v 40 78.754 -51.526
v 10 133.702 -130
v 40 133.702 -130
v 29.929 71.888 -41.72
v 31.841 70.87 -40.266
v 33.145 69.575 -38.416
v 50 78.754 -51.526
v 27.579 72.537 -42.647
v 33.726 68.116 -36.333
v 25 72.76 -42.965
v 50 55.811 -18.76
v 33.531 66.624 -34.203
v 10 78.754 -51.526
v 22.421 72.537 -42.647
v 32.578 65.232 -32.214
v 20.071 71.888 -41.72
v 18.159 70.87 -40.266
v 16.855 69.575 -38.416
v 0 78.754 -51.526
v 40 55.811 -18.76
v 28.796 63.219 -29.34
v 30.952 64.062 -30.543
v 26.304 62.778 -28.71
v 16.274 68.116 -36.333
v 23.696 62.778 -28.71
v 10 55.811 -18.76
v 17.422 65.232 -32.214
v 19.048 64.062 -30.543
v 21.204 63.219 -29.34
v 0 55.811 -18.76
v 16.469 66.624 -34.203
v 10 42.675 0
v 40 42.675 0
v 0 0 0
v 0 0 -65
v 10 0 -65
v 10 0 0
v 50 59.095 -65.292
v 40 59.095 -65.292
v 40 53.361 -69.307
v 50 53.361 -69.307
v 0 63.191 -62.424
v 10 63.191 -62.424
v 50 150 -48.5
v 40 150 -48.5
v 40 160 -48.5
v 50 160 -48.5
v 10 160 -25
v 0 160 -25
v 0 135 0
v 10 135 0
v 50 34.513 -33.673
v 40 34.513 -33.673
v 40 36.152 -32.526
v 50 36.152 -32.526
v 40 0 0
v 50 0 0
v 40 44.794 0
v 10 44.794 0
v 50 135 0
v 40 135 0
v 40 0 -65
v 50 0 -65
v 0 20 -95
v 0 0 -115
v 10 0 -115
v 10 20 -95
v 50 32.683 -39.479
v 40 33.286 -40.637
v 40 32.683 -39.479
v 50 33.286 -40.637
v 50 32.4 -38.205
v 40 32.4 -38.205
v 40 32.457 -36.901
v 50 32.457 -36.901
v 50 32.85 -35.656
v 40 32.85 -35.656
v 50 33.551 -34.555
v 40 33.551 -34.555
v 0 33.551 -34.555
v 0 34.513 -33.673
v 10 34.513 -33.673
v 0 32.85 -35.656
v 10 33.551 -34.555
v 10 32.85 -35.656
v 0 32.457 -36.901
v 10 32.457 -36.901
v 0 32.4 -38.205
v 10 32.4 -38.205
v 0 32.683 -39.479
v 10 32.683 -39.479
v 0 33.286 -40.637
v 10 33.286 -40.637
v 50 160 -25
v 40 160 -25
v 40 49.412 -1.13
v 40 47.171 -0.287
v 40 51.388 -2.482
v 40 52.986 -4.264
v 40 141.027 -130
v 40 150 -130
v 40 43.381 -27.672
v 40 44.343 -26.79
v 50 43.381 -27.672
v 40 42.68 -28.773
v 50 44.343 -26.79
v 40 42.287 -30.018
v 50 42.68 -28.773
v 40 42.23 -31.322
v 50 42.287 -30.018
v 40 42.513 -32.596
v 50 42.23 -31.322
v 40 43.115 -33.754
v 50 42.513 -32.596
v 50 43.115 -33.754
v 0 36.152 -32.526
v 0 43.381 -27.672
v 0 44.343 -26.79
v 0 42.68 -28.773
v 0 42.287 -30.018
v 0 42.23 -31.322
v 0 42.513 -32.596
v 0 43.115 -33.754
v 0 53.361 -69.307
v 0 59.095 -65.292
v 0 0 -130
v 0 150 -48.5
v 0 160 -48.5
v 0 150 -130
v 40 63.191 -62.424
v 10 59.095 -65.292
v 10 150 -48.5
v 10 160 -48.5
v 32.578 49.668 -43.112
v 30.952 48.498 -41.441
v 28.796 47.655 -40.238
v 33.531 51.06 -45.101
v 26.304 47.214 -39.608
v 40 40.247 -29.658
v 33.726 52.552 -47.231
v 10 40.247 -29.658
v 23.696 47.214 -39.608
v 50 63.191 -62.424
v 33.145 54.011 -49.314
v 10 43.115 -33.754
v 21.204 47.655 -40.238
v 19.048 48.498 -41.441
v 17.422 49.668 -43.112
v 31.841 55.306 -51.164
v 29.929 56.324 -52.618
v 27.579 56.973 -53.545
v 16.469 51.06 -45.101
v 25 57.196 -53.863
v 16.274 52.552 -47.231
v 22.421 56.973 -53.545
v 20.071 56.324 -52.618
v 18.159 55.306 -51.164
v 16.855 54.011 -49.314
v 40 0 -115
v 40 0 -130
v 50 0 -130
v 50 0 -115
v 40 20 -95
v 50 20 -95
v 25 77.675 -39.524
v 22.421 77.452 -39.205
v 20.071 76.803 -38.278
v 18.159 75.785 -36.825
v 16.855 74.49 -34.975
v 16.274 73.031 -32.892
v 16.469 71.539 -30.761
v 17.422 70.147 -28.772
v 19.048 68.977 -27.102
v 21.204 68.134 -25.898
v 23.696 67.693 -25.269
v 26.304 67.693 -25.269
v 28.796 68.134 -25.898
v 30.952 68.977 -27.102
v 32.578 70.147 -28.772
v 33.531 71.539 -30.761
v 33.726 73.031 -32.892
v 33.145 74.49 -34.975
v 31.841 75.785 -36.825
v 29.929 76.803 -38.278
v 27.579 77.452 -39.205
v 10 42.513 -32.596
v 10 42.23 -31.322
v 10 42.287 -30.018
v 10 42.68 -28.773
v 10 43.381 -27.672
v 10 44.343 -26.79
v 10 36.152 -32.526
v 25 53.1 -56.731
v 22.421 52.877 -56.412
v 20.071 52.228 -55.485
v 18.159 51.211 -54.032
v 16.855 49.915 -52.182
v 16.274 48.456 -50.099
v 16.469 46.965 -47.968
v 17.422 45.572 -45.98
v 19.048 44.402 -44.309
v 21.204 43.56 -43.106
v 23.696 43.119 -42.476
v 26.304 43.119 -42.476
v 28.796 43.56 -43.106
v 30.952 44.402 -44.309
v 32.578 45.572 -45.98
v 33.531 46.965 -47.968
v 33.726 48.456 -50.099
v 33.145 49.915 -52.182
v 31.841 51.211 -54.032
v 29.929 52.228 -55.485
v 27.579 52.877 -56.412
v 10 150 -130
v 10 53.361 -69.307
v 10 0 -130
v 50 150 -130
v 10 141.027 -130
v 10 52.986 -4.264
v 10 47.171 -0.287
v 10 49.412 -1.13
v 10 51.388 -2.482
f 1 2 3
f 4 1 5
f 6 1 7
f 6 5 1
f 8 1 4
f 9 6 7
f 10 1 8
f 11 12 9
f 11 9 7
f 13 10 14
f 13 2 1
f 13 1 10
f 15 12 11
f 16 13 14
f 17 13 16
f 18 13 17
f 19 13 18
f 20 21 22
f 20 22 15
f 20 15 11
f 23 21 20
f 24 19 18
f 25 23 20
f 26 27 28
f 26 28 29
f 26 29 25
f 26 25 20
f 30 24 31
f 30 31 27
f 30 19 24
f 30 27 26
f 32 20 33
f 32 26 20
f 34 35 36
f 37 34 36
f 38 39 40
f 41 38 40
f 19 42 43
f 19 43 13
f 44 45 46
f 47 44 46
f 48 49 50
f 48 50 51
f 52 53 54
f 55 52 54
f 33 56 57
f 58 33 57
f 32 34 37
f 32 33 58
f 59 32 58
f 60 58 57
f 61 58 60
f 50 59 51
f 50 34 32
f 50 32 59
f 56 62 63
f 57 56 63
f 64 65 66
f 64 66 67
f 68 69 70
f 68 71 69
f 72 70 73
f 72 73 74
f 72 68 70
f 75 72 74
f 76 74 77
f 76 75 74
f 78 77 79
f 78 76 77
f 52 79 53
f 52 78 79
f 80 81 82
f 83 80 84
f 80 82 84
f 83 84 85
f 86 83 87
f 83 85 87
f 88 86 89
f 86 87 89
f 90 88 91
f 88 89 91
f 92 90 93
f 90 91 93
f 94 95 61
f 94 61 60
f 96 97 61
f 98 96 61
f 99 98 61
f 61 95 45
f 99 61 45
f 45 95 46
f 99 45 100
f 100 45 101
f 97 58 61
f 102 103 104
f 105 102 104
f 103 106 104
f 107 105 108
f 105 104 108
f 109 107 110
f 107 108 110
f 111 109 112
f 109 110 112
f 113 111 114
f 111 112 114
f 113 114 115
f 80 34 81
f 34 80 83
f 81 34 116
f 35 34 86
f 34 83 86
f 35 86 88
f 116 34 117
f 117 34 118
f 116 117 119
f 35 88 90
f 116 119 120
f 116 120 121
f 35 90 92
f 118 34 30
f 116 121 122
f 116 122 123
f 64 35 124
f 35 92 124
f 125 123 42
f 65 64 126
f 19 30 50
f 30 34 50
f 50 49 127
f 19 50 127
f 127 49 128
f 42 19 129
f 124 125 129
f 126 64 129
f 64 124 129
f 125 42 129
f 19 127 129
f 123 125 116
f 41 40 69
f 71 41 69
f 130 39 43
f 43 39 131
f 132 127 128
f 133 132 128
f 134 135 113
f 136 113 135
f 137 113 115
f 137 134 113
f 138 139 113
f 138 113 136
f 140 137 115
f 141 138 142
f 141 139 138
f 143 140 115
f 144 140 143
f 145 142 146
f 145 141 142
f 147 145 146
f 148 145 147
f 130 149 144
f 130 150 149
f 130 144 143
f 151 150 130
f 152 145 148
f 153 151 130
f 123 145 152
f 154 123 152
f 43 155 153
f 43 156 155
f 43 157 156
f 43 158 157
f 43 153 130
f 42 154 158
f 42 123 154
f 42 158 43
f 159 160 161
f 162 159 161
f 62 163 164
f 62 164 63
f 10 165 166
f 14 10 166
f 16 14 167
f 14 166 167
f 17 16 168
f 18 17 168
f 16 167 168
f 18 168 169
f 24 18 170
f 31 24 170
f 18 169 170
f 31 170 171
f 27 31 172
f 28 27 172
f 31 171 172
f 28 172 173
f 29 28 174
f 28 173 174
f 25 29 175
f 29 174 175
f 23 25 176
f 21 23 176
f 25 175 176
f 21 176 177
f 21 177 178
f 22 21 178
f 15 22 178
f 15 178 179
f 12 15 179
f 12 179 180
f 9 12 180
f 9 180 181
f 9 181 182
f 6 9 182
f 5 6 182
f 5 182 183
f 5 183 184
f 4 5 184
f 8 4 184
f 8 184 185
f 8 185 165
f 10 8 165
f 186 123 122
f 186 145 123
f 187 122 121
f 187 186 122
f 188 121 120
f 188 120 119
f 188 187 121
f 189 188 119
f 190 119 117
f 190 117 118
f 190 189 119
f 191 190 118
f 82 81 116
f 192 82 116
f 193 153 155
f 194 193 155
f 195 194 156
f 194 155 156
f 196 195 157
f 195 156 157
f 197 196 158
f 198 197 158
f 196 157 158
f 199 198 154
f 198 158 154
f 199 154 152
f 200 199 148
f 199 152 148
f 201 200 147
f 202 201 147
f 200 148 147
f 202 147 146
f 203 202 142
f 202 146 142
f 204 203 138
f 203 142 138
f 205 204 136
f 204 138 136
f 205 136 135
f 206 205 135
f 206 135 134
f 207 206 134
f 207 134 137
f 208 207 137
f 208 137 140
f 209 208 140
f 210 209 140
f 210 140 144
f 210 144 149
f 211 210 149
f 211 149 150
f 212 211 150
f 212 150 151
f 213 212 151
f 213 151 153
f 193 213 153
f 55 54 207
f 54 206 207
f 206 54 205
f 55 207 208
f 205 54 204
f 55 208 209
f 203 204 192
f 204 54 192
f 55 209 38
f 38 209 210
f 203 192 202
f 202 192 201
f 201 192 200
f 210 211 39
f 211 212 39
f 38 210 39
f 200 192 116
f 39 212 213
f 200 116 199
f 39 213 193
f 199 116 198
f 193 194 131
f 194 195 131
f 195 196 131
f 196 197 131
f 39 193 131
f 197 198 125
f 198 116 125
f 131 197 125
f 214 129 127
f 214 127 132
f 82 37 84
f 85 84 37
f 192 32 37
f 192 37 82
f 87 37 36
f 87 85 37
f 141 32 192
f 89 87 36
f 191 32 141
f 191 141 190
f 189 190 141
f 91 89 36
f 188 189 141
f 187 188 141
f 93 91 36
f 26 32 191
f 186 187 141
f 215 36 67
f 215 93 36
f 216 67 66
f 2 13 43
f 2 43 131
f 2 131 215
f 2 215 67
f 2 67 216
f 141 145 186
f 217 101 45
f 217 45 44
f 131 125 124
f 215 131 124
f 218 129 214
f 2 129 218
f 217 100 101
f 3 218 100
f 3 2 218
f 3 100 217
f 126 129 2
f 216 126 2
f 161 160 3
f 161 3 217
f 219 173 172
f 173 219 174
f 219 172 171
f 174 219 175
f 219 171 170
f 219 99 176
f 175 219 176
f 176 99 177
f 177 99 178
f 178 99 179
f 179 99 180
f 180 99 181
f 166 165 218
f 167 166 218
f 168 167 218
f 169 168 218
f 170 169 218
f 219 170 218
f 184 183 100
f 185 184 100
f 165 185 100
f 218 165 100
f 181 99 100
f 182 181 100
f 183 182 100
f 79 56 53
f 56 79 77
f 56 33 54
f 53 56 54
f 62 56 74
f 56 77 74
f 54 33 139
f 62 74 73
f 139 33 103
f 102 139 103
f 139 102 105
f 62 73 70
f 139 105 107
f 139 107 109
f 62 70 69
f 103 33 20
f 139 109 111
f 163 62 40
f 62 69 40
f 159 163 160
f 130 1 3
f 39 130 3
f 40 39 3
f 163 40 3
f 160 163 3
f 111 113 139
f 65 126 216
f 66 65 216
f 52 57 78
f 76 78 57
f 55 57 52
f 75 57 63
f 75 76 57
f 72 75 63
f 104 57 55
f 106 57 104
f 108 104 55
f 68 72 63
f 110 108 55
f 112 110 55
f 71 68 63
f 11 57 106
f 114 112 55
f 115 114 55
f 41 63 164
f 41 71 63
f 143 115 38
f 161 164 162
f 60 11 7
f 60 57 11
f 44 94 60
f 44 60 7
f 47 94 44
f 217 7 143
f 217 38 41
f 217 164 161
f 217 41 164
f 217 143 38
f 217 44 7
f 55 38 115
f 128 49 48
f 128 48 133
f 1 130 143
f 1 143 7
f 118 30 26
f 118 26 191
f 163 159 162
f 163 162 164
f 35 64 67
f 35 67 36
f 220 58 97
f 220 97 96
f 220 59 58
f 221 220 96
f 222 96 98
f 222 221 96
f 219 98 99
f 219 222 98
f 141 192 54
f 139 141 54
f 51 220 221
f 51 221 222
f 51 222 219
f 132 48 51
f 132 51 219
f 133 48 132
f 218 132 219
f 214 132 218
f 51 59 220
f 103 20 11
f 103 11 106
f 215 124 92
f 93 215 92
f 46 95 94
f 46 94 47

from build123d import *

# Parameters (mm, degrees)
SKETCH5_W           = 50.00000000000001
SKETCH5_H           = 130
BOSS_EXTRUDE1_DEPTH = 150
CUT_EXTRUDE1_START  = -25
CUT_EXTRUDE1_DEPTH  = 15
BOSS_EXTRUDE3_START = 30
BOSS_EXTRUDE3_DEPTH = 5
SKETCH10_R          = 8.750000000000018
CUT_EXTRUDE3_DEPTH  = 100
SKETCH18_W          = 48.5
SKETCH18_H          = 10
BOSS_EXTRUDE4_DEPTH = 10
BOSS_EXTRUDE5_START = 40
SKETCH18_2_W        = 48.5
SKETCH18_2_H        = 10
BOSS_EXTRUDE5_DEPTH = 10
CHAMFER1_SIZE       = 25
CUT_EXTRUDE5_DEPTH  = 70
FILLET1_R           = 5
CUT_EXTRUDE6_DEPTH  = 70
FILLET2_R           = 10


with BuildPart() as part:
    # Sketch5 → Boss-Extrude1 (new body)
    with BuildSketch(Plane(origin=(0, 0, 0), x_dir=(1, 0, 0), z_dir=(0, 1, 0))):
        with Locations((25.000000000000004, 65)):
            Rectangle(SKETCH5_W, SKETCH5_H)
    extrude(amount=BOSS_EXTRUDE1_DEPTH)

    # Sketch7 → Cut-Extrude1 (cut, symmetric)
    with BuildSketch(Plane(origin=(50, 0, 0), x_dir=(0, 0, -1), z_dir=(1, 0, 0)).offset(CUT_EXTRUDE1_START)):
        Polygon((0, 50), (129.99999999999997, 141.02697996726184), (130, 150), (0, 150), align=None)
        Polygon((130, 0), (130, 133.70233243469318), (0, 42.67535246743131), (0, 0), align=None)
    extrude(amount=CUT_EXTRUDE1_DEPTH, both=True, mode=Mode.SUBTRACT)

    # Sketch17 → Boss-Extrude3 (add)
    with BuildSketch(Plane(origin=(1.261e-14, 275.41205482615817, -321.9217767956235), x_dir=(1, 0, 0), z_dir=(0, -0.819152044288993, -0.5735764363510444)).offset(BOSS_EXTRUDE3_START)):
        Polygon((9.99999999999999, 374.2932281420449), (39.999999999999986, 374.2932281420449), (39.999999999999986, 334.2932281420449), (9.999999999999993, 334.2932281420449), align=None)
    extrude(amount=-BOSS_EXTRUDE3_DEPTH)

    # Sketch10 → Cut-Extrude3 (cut)
    with BuildSketch(Plane(origin=(0, 33.55050358314182, 23.492315519647676), x_dir=(1, 0, 0), z_dir=(0, 0.819152044288993, 0.5735764363510444))):
        with Locations((25, 68.17827312728308)):
            Circle(SKETCH10_R)
    extrude(amount=-CUT_EXTRUDE3_DEPTH, mode=Mode.SUBTRACT)

    # Sketch18 → Boss-Extrude4 (add)
    with BuildSketch(Plane(origin=(0, 0, 0), x_dir=(0, 0, -1), z_dir=(1, 0, 0))):
        with Locations((24.25, 155)):
            Rectangle(SKETCH18_W, SKETCH18_H)
    extrude(amount=BOSS_EXTRUDE4_DEPTH)

    # Sketch18<2> → Boss-Extrude5 (add)
    with BuildSketch(Plane(origin=(0, 0, 0), x_dir=(0, 0, -1), z_dir=(1, 0, 0)).offset(BOSS_EXTRUDE5_START)):
        with Locations((24.25, 155)):
            Rectangle(SKETCH18_2_W, SKETCH18_2_H)
    extrude(amount=BOSS_EXTRUDE5_DEPTH)

    # Chamfer1
    chamfer1_edges = [part.edges().sort_by_distance(p)[0] for p in [
        (5, 160, 0),
        (45, 160, 0),
    ]]
    chamfer(chamfer1_edges, length=CHAMFER1_SIZE)

    # Sketch21 → Cut-Extrude5 (cut)
    with BuildSketch(Plane(origin=(0, 0, 0), x_dir=(0, 0, -1), z_dir=(1, 0, 0))):
        Polygon((29.65812470831714, 40.2474777708908), (62.424206479876844, 63.19053522493257), (51.526254189207016, 78.75442406642354), (18.76017241764731, 55.81136661238177), align=None)
        Polygon((69.30712371608935, 53.36071069346464), (65.29208866163206, 59.0947750034876), (32.52600689007236, 36.15171754944583), (36.54104194452965, 30.417653239422872), align=None)
    extrude(amount=CUT_EXTRUDE5_DEPTH, mode=Mode.SUBTRACT)

    # Fillet1
    fillet1_edges = [part.edges().sort_by_distance(p)[0] for p in [
        (5, 30.417653239422872, -36.54104194452965),
        (45, 30.417653239422872, -36.54104194452965),
        (5.000000000000001, 40.2474777708908, -29.65812470831714),
        (45, 40.2474777708908, -29.65812470831714),
    ]]
    fillet(fillet1_edges, radius=FILLET1_R)

    # Sketch22 → Cut-Extrude6 (cut)
    with BuildSketch(Plane.ZY):
        Polygon((-115, 0), (-95, 20), (-65, 0), align=None)
    extrude(amount=-CUT_EXTRUDE6_DEPTH, mode=Mode.SUBTRACT)

    # Fillet2
    fillet2_edges = [part.edges().sort_by_distance(p)[0] for p in [
        (25, 50, 0),
    ]]
    fillet(fillet2_edges, radius=FILLET2_R)


solid = part.part
